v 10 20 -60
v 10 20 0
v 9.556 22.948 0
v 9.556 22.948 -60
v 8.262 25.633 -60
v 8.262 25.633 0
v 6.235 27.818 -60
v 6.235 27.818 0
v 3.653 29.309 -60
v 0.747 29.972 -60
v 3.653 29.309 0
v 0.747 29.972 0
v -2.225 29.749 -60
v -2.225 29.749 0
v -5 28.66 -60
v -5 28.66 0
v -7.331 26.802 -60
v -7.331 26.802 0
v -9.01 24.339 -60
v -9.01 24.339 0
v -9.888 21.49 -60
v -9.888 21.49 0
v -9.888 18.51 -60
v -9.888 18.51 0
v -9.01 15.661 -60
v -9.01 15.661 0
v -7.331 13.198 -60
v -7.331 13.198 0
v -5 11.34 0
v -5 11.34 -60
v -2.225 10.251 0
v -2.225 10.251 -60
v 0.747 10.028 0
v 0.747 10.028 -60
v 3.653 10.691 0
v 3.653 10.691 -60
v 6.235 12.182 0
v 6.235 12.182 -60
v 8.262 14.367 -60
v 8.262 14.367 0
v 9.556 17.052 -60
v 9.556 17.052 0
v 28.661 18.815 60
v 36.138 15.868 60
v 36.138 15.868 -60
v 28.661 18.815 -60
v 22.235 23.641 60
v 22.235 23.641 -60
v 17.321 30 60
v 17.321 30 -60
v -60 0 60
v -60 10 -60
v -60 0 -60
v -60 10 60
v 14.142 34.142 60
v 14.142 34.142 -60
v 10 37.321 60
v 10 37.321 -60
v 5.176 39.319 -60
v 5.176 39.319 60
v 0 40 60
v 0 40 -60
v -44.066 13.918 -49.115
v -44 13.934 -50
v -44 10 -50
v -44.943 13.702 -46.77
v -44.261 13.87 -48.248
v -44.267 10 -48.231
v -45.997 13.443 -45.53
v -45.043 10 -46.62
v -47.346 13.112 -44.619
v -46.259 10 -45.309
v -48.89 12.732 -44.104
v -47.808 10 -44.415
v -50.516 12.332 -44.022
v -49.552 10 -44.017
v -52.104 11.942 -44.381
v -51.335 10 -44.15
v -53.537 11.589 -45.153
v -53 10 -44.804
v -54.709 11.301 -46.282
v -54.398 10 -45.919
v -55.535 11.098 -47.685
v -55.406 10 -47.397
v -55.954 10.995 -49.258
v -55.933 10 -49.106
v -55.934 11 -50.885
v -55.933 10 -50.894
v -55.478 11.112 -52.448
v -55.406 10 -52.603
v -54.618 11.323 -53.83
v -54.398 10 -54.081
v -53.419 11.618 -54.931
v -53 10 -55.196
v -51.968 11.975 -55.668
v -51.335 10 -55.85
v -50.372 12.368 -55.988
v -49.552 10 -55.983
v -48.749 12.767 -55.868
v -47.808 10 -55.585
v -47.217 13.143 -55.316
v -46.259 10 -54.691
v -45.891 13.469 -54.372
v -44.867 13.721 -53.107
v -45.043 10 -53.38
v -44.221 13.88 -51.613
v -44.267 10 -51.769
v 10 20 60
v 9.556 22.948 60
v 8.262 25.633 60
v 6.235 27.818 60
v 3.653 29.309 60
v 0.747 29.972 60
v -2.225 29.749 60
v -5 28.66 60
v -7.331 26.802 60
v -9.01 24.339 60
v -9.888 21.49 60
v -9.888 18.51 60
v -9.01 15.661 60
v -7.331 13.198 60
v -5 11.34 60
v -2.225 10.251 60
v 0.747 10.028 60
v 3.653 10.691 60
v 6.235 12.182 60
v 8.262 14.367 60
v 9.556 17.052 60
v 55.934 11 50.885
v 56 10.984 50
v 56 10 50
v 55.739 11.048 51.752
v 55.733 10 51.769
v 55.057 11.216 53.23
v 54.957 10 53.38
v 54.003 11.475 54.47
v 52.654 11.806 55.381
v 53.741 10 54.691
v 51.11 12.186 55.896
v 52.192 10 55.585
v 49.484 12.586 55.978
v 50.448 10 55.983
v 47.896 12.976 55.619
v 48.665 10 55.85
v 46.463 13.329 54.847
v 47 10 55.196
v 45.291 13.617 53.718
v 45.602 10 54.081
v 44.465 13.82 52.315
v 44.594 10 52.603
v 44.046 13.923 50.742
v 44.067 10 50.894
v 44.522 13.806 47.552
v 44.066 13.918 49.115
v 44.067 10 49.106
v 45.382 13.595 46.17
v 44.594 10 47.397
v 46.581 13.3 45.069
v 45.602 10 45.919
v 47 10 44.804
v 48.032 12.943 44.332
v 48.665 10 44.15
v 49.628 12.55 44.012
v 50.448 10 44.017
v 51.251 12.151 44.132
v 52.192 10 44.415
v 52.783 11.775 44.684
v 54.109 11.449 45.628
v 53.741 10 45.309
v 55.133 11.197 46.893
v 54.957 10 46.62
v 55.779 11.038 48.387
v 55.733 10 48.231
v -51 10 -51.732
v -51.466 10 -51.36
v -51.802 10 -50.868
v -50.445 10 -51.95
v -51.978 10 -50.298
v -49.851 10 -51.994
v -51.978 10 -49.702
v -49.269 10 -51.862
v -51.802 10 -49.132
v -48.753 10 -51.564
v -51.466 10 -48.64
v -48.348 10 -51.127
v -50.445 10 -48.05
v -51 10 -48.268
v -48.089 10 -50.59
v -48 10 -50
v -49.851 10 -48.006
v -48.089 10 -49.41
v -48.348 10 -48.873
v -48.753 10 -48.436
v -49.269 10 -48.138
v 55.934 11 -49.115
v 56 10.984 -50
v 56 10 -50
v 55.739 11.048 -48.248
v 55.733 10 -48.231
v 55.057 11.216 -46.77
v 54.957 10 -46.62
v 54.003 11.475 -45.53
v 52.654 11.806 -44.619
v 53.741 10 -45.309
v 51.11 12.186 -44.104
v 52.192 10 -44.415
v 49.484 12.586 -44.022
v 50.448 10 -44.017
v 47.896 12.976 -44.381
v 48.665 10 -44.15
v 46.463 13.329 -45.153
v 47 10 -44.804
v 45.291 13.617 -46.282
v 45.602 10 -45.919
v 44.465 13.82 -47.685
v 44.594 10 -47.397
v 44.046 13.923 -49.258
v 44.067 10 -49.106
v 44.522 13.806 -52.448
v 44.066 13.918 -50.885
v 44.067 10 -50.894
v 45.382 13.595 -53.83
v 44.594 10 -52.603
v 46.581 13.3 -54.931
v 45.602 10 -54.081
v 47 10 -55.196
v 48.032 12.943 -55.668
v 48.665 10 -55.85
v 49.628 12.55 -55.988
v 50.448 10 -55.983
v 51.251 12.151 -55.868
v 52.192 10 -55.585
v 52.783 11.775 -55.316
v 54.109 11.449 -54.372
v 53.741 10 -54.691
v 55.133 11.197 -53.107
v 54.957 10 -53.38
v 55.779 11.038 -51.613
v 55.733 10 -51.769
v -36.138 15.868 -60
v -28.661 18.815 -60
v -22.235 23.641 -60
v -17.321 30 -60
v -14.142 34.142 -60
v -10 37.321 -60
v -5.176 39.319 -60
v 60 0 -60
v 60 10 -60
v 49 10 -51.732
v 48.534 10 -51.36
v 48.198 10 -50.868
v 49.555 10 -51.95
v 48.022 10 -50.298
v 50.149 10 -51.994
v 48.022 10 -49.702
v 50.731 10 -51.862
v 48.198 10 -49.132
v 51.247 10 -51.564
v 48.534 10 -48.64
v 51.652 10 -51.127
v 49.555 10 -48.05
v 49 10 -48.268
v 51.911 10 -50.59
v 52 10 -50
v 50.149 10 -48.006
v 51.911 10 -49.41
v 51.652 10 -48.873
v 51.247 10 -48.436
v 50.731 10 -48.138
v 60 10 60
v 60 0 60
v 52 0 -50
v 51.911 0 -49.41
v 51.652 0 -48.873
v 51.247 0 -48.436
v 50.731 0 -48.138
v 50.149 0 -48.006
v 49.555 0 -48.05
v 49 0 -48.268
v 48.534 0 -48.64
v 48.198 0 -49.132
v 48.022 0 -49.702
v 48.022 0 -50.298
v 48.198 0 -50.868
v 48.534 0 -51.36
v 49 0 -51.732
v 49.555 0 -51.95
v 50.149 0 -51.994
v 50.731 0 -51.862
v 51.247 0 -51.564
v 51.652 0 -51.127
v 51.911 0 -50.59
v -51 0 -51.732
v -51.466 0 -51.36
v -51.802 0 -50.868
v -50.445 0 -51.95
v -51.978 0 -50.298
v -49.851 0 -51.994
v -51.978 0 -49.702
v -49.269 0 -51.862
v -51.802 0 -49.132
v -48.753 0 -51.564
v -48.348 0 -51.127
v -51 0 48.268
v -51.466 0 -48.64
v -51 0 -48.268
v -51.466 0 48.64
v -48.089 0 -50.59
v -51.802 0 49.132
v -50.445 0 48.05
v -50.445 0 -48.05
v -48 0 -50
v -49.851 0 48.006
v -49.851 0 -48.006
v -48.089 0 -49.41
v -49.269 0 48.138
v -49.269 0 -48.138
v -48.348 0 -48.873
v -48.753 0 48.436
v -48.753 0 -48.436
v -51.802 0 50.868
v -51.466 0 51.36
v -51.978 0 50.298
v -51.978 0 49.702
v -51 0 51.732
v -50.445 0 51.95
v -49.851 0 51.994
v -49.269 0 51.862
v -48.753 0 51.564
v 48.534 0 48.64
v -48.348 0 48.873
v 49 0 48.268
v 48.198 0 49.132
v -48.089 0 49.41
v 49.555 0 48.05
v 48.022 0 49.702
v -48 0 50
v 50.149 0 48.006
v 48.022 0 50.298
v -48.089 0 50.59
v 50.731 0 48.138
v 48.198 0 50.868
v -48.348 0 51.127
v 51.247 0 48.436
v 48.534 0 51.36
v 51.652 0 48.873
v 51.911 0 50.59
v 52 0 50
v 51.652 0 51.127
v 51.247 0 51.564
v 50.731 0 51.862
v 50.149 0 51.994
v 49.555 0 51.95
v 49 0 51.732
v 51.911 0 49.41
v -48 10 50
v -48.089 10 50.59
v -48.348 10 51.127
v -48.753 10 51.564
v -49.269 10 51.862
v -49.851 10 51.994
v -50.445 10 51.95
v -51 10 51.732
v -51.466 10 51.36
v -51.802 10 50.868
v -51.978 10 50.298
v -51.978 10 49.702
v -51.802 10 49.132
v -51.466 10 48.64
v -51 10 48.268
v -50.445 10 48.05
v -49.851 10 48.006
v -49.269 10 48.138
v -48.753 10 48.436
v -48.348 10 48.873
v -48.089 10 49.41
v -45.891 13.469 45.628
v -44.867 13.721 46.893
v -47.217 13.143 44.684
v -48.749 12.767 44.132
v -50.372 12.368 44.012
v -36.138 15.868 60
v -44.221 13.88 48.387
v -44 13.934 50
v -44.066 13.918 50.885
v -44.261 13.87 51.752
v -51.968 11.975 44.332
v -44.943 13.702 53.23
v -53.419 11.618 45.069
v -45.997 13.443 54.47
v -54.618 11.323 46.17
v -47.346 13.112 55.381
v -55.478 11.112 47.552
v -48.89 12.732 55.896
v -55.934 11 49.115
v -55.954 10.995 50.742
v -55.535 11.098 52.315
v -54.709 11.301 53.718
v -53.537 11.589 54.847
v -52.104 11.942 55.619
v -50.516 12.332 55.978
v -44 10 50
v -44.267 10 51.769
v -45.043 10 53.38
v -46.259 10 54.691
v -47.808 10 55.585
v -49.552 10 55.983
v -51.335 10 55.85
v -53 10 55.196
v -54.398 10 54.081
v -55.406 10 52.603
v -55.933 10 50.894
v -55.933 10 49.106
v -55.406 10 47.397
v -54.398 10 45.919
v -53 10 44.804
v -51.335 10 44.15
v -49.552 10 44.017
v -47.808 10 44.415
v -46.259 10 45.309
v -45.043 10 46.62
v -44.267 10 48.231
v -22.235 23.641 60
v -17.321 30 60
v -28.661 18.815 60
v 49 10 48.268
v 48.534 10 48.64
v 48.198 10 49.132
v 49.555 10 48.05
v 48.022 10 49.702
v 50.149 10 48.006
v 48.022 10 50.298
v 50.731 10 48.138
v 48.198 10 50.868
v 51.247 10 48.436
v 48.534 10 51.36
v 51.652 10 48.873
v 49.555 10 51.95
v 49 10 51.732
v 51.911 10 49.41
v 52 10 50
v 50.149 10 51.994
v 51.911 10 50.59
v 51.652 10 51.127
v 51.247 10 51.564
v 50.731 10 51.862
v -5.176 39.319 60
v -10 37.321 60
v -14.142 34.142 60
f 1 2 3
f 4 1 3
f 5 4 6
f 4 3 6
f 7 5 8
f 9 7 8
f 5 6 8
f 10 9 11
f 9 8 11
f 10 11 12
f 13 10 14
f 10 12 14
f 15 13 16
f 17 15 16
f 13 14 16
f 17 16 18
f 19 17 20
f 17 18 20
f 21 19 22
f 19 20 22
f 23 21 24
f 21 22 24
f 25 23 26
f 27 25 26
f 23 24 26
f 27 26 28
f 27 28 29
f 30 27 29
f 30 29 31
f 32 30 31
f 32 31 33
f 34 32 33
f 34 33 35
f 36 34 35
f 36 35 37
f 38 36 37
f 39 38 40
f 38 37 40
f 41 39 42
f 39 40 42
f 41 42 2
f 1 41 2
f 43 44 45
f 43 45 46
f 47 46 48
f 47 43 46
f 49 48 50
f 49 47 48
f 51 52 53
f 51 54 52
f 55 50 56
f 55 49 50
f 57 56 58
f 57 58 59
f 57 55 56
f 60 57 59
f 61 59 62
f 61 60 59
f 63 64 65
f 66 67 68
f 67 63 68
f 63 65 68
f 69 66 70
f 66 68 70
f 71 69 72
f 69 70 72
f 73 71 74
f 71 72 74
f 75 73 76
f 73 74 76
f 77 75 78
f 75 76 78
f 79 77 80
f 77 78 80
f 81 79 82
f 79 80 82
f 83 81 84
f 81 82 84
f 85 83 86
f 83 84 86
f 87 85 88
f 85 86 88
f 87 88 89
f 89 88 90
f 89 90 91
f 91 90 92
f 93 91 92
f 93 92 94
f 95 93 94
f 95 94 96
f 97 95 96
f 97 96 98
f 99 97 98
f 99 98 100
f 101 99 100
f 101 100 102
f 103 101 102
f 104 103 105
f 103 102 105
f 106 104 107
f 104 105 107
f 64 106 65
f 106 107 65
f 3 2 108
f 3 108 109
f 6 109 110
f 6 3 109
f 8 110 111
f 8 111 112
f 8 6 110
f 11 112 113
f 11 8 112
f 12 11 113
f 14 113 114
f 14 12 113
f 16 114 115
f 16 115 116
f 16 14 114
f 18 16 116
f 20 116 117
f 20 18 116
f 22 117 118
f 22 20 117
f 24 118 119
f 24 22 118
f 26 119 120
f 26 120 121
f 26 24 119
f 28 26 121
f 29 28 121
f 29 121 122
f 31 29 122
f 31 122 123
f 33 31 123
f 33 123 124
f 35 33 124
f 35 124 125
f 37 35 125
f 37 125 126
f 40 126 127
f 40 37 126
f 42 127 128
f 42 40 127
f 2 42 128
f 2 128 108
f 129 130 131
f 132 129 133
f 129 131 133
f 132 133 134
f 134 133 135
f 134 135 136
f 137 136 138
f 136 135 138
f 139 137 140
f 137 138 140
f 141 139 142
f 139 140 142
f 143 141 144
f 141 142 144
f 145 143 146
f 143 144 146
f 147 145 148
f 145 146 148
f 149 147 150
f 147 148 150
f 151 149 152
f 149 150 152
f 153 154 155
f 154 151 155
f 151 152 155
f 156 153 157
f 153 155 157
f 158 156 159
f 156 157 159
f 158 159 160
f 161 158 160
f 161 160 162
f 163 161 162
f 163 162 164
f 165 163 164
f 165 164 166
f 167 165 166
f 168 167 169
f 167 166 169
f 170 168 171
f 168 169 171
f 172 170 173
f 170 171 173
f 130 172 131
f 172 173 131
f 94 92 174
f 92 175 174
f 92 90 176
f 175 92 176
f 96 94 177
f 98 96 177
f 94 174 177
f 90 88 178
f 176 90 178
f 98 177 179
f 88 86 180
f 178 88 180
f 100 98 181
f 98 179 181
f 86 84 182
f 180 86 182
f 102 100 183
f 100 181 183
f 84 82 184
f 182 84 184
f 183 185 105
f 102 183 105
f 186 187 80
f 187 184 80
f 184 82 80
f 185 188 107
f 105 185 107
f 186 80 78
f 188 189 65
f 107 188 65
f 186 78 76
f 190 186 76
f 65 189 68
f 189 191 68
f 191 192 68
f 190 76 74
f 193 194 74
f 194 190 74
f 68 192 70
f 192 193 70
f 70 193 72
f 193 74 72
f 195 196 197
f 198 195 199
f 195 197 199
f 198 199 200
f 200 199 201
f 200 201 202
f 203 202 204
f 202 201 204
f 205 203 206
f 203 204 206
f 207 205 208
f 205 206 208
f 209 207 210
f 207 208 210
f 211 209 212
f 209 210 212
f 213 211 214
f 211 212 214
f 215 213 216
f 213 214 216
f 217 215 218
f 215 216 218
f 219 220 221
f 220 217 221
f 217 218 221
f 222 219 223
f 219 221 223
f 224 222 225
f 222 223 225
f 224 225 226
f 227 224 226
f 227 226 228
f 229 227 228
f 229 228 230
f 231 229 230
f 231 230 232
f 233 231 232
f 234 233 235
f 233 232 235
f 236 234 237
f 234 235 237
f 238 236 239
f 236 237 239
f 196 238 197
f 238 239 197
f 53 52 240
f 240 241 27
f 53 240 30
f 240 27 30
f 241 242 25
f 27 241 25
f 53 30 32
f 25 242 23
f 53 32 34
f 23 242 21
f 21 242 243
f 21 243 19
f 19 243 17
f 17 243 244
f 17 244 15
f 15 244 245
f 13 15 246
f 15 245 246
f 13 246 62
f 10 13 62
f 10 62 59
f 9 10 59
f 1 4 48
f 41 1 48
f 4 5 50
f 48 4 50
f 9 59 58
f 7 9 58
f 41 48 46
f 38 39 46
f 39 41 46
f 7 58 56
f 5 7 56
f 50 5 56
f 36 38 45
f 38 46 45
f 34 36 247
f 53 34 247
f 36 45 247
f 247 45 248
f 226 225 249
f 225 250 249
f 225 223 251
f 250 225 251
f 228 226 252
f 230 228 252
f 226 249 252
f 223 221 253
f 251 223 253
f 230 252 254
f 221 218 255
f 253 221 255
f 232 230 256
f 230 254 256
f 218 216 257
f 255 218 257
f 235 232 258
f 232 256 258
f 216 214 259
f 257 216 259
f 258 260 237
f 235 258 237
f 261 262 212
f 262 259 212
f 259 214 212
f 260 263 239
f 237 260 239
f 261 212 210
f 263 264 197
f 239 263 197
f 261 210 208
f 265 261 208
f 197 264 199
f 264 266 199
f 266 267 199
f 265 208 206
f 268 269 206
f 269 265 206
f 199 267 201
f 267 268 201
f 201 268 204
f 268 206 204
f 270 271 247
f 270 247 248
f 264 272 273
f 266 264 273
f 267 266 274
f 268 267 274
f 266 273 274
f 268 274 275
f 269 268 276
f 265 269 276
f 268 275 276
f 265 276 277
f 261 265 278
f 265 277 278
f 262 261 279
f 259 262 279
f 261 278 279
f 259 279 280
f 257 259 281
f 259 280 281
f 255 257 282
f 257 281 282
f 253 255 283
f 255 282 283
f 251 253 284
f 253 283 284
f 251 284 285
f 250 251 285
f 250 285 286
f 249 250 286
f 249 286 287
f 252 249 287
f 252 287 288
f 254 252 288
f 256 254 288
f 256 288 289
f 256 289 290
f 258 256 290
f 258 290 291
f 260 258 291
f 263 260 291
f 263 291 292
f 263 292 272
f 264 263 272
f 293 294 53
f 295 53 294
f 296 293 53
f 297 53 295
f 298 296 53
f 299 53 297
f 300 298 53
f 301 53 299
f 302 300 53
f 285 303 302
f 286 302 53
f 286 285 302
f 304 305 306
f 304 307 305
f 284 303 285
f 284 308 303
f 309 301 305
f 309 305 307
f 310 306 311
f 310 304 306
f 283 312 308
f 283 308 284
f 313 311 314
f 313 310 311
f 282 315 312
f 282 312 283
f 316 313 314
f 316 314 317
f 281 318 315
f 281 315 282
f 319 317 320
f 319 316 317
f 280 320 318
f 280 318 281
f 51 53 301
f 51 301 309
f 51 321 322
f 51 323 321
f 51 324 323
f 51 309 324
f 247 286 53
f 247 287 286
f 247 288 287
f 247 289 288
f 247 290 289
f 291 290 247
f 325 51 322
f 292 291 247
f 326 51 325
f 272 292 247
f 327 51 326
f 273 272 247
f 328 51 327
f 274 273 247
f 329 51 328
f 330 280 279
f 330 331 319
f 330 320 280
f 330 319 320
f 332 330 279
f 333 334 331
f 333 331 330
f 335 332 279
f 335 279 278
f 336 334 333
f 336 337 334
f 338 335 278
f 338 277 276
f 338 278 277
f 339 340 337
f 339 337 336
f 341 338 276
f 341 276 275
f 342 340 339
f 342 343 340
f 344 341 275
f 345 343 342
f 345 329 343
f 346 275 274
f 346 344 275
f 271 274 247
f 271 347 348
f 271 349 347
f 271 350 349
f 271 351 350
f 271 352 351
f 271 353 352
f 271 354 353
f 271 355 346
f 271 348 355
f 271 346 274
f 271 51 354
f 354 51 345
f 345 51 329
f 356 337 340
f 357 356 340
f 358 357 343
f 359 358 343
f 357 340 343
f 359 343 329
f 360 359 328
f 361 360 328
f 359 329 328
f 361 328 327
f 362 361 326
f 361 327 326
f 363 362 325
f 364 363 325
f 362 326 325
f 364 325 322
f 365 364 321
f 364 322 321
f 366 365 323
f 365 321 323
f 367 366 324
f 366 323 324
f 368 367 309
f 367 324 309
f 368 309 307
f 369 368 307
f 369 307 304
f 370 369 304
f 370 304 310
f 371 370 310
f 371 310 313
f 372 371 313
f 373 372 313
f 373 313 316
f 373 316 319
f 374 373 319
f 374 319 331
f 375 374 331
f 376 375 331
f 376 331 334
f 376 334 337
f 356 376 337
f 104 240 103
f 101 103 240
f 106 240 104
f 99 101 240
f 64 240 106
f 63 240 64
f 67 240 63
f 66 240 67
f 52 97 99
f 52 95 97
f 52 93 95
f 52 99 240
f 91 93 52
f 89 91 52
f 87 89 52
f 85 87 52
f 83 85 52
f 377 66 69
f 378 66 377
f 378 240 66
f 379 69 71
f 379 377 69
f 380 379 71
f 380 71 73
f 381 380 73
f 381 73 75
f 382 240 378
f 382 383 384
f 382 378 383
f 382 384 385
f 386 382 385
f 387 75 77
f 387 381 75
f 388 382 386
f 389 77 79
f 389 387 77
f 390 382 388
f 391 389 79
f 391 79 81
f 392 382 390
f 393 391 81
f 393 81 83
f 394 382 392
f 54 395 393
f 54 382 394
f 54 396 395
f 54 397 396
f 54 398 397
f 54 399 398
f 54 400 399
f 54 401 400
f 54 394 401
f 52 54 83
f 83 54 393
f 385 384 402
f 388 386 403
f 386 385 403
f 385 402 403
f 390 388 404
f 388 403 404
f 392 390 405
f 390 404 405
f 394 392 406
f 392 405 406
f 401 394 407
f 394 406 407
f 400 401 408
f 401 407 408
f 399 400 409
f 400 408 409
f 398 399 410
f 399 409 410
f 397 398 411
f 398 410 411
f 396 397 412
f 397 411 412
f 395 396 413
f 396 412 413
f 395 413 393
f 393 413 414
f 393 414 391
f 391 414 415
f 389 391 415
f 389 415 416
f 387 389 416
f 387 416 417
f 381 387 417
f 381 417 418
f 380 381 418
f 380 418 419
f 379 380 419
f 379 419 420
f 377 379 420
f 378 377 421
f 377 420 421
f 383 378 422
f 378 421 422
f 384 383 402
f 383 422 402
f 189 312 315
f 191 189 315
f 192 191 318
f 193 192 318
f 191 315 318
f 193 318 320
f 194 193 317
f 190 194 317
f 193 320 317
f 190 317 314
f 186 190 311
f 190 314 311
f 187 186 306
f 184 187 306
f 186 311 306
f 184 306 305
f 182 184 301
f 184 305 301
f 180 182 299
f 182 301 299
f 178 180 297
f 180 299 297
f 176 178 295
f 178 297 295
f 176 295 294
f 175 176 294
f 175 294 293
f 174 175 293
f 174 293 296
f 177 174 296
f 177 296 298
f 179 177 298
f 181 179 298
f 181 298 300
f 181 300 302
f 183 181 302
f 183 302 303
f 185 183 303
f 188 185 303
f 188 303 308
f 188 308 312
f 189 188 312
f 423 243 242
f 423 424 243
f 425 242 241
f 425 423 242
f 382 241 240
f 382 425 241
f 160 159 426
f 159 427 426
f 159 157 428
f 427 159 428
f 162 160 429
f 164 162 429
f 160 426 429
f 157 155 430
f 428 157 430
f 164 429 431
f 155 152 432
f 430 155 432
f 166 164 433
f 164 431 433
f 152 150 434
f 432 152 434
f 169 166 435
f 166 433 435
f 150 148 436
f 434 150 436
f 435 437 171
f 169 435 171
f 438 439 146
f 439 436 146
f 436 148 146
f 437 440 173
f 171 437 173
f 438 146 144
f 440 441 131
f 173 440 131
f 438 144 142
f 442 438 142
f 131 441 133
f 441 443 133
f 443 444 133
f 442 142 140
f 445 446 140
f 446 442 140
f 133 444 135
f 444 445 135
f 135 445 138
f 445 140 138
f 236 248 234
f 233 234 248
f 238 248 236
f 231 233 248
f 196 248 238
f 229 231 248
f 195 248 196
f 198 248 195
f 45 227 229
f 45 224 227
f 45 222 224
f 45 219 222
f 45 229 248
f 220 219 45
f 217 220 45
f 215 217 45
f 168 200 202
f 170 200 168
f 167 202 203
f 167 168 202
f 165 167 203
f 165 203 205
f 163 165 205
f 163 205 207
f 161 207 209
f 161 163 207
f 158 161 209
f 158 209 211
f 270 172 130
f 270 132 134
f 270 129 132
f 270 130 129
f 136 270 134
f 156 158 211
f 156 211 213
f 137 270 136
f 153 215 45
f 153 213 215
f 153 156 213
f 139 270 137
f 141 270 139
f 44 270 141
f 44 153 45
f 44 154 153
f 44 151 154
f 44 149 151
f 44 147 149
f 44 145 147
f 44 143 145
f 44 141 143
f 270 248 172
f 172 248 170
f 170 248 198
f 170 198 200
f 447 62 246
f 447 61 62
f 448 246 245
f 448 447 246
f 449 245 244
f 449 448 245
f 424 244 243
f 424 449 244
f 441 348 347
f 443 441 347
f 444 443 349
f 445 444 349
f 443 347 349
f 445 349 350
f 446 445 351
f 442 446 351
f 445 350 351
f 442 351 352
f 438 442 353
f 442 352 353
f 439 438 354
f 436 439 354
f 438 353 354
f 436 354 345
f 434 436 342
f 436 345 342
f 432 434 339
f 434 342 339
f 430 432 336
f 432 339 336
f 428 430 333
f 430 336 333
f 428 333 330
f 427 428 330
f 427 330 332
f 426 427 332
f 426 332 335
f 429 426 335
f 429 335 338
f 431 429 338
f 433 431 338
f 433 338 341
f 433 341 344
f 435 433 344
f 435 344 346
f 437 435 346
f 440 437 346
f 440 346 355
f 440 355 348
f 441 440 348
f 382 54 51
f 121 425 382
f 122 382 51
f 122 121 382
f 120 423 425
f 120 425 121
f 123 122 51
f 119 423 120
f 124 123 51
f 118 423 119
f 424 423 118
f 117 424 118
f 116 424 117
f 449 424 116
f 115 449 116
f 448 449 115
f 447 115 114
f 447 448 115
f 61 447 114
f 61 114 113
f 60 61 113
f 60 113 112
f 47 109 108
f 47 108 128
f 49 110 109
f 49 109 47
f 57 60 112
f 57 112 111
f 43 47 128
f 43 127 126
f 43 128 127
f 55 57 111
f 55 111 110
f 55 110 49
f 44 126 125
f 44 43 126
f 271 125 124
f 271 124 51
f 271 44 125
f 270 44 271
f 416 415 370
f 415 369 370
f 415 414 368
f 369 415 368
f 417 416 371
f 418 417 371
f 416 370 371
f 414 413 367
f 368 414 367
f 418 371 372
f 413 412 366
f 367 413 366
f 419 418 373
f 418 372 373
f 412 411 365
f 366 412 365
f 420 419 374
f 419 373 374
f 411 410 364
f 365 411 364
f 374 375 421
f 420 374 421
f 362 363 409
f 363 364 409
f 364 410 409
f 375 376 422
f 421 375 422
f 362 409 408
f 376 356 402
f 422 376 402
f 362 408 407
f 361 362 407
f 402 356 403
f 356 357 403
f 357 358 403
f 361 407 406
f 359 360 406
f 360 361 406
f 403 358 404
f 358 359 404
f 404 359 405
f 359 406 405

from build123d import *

# Parameters (mm, degrees)
F0_R          = 10
F1_DEPTH      = 60
F1_DEPTH_BACK = 60
F2_R          = 2
F3_DEPTH      = 25
F5_START      = -10
F4_R          = 6
F5_DEPTH      = 15


with BuildPart() as f1:
    # F0 (on Top) → F1 (new body, two sides)
    with BuildSketch(Plane.XY) as f1_sk:
        with BuildLine():
            Line((-60, 10), (-60, 0))
            Line((-60, 0), (0, 0))
            Line((0, 0), (60, 0))
            Line((60, 0), (60, 10))
            Line((60, 10), (36.1375661614, 15.867864057))
            ThreePointArc((36.1375661614, 15.867864057), (25.2854930612, 21.0118409528), (17.3205080757, 30))
            ThreePointArc((17.3205080757, 30), (10, 37.3205080757), (0, 40))
            ThreePointArc((0, 40), (-10, 37.3205080757), (-17.3205080757, 30))
            ThreePointArc((-17.3205080757, 30), (-25.2854930612, 21.0118409528), (-36.1375661614, 15.867864057))
            Line((-36.1375661614, 15.867864057), (-60, 10))
        make_face()
        with Locations((0, 20)):
            Circle(F0_R, mode=Mode.SUBTRACT)
    extrude(amount=F1_DEPTH)
    extrude(f1_sk.sketch, amount=-F1_DEPTH_BACK)

    # F2 (on face) → F3 (cut)
    with BuildSketch(Plane.XZ):
        with Locations((-50, 50)):
            Circle(F2_R)
        with Locations((50, 50)):
            Circle(F2_R)
        with Locations((-50, -50)):
            Circle(F2_R)
        with Locations((50, -50)):
            Circle(F2_R)
    extrude(amount=-F3_DEPTH, mode=Mode.SUBTRACT)

    # F4 (on face) → F5 (cut)
    with BuildSketch(Plane.XZ.offset(F5_START)):
        with Locations((-50, 50)):
            Circle(F4_R)
        with Locations((50, -50)):
            Circle(F4_R)
        with Locations((-50, -50)):
            Circle(F4_R)
        with Locations((50, 50)):
            Circle(F4_R)
    extrude(amount=-F5_DEPTH, mode=Mode.SUBTRACT)


solid = f1.part
